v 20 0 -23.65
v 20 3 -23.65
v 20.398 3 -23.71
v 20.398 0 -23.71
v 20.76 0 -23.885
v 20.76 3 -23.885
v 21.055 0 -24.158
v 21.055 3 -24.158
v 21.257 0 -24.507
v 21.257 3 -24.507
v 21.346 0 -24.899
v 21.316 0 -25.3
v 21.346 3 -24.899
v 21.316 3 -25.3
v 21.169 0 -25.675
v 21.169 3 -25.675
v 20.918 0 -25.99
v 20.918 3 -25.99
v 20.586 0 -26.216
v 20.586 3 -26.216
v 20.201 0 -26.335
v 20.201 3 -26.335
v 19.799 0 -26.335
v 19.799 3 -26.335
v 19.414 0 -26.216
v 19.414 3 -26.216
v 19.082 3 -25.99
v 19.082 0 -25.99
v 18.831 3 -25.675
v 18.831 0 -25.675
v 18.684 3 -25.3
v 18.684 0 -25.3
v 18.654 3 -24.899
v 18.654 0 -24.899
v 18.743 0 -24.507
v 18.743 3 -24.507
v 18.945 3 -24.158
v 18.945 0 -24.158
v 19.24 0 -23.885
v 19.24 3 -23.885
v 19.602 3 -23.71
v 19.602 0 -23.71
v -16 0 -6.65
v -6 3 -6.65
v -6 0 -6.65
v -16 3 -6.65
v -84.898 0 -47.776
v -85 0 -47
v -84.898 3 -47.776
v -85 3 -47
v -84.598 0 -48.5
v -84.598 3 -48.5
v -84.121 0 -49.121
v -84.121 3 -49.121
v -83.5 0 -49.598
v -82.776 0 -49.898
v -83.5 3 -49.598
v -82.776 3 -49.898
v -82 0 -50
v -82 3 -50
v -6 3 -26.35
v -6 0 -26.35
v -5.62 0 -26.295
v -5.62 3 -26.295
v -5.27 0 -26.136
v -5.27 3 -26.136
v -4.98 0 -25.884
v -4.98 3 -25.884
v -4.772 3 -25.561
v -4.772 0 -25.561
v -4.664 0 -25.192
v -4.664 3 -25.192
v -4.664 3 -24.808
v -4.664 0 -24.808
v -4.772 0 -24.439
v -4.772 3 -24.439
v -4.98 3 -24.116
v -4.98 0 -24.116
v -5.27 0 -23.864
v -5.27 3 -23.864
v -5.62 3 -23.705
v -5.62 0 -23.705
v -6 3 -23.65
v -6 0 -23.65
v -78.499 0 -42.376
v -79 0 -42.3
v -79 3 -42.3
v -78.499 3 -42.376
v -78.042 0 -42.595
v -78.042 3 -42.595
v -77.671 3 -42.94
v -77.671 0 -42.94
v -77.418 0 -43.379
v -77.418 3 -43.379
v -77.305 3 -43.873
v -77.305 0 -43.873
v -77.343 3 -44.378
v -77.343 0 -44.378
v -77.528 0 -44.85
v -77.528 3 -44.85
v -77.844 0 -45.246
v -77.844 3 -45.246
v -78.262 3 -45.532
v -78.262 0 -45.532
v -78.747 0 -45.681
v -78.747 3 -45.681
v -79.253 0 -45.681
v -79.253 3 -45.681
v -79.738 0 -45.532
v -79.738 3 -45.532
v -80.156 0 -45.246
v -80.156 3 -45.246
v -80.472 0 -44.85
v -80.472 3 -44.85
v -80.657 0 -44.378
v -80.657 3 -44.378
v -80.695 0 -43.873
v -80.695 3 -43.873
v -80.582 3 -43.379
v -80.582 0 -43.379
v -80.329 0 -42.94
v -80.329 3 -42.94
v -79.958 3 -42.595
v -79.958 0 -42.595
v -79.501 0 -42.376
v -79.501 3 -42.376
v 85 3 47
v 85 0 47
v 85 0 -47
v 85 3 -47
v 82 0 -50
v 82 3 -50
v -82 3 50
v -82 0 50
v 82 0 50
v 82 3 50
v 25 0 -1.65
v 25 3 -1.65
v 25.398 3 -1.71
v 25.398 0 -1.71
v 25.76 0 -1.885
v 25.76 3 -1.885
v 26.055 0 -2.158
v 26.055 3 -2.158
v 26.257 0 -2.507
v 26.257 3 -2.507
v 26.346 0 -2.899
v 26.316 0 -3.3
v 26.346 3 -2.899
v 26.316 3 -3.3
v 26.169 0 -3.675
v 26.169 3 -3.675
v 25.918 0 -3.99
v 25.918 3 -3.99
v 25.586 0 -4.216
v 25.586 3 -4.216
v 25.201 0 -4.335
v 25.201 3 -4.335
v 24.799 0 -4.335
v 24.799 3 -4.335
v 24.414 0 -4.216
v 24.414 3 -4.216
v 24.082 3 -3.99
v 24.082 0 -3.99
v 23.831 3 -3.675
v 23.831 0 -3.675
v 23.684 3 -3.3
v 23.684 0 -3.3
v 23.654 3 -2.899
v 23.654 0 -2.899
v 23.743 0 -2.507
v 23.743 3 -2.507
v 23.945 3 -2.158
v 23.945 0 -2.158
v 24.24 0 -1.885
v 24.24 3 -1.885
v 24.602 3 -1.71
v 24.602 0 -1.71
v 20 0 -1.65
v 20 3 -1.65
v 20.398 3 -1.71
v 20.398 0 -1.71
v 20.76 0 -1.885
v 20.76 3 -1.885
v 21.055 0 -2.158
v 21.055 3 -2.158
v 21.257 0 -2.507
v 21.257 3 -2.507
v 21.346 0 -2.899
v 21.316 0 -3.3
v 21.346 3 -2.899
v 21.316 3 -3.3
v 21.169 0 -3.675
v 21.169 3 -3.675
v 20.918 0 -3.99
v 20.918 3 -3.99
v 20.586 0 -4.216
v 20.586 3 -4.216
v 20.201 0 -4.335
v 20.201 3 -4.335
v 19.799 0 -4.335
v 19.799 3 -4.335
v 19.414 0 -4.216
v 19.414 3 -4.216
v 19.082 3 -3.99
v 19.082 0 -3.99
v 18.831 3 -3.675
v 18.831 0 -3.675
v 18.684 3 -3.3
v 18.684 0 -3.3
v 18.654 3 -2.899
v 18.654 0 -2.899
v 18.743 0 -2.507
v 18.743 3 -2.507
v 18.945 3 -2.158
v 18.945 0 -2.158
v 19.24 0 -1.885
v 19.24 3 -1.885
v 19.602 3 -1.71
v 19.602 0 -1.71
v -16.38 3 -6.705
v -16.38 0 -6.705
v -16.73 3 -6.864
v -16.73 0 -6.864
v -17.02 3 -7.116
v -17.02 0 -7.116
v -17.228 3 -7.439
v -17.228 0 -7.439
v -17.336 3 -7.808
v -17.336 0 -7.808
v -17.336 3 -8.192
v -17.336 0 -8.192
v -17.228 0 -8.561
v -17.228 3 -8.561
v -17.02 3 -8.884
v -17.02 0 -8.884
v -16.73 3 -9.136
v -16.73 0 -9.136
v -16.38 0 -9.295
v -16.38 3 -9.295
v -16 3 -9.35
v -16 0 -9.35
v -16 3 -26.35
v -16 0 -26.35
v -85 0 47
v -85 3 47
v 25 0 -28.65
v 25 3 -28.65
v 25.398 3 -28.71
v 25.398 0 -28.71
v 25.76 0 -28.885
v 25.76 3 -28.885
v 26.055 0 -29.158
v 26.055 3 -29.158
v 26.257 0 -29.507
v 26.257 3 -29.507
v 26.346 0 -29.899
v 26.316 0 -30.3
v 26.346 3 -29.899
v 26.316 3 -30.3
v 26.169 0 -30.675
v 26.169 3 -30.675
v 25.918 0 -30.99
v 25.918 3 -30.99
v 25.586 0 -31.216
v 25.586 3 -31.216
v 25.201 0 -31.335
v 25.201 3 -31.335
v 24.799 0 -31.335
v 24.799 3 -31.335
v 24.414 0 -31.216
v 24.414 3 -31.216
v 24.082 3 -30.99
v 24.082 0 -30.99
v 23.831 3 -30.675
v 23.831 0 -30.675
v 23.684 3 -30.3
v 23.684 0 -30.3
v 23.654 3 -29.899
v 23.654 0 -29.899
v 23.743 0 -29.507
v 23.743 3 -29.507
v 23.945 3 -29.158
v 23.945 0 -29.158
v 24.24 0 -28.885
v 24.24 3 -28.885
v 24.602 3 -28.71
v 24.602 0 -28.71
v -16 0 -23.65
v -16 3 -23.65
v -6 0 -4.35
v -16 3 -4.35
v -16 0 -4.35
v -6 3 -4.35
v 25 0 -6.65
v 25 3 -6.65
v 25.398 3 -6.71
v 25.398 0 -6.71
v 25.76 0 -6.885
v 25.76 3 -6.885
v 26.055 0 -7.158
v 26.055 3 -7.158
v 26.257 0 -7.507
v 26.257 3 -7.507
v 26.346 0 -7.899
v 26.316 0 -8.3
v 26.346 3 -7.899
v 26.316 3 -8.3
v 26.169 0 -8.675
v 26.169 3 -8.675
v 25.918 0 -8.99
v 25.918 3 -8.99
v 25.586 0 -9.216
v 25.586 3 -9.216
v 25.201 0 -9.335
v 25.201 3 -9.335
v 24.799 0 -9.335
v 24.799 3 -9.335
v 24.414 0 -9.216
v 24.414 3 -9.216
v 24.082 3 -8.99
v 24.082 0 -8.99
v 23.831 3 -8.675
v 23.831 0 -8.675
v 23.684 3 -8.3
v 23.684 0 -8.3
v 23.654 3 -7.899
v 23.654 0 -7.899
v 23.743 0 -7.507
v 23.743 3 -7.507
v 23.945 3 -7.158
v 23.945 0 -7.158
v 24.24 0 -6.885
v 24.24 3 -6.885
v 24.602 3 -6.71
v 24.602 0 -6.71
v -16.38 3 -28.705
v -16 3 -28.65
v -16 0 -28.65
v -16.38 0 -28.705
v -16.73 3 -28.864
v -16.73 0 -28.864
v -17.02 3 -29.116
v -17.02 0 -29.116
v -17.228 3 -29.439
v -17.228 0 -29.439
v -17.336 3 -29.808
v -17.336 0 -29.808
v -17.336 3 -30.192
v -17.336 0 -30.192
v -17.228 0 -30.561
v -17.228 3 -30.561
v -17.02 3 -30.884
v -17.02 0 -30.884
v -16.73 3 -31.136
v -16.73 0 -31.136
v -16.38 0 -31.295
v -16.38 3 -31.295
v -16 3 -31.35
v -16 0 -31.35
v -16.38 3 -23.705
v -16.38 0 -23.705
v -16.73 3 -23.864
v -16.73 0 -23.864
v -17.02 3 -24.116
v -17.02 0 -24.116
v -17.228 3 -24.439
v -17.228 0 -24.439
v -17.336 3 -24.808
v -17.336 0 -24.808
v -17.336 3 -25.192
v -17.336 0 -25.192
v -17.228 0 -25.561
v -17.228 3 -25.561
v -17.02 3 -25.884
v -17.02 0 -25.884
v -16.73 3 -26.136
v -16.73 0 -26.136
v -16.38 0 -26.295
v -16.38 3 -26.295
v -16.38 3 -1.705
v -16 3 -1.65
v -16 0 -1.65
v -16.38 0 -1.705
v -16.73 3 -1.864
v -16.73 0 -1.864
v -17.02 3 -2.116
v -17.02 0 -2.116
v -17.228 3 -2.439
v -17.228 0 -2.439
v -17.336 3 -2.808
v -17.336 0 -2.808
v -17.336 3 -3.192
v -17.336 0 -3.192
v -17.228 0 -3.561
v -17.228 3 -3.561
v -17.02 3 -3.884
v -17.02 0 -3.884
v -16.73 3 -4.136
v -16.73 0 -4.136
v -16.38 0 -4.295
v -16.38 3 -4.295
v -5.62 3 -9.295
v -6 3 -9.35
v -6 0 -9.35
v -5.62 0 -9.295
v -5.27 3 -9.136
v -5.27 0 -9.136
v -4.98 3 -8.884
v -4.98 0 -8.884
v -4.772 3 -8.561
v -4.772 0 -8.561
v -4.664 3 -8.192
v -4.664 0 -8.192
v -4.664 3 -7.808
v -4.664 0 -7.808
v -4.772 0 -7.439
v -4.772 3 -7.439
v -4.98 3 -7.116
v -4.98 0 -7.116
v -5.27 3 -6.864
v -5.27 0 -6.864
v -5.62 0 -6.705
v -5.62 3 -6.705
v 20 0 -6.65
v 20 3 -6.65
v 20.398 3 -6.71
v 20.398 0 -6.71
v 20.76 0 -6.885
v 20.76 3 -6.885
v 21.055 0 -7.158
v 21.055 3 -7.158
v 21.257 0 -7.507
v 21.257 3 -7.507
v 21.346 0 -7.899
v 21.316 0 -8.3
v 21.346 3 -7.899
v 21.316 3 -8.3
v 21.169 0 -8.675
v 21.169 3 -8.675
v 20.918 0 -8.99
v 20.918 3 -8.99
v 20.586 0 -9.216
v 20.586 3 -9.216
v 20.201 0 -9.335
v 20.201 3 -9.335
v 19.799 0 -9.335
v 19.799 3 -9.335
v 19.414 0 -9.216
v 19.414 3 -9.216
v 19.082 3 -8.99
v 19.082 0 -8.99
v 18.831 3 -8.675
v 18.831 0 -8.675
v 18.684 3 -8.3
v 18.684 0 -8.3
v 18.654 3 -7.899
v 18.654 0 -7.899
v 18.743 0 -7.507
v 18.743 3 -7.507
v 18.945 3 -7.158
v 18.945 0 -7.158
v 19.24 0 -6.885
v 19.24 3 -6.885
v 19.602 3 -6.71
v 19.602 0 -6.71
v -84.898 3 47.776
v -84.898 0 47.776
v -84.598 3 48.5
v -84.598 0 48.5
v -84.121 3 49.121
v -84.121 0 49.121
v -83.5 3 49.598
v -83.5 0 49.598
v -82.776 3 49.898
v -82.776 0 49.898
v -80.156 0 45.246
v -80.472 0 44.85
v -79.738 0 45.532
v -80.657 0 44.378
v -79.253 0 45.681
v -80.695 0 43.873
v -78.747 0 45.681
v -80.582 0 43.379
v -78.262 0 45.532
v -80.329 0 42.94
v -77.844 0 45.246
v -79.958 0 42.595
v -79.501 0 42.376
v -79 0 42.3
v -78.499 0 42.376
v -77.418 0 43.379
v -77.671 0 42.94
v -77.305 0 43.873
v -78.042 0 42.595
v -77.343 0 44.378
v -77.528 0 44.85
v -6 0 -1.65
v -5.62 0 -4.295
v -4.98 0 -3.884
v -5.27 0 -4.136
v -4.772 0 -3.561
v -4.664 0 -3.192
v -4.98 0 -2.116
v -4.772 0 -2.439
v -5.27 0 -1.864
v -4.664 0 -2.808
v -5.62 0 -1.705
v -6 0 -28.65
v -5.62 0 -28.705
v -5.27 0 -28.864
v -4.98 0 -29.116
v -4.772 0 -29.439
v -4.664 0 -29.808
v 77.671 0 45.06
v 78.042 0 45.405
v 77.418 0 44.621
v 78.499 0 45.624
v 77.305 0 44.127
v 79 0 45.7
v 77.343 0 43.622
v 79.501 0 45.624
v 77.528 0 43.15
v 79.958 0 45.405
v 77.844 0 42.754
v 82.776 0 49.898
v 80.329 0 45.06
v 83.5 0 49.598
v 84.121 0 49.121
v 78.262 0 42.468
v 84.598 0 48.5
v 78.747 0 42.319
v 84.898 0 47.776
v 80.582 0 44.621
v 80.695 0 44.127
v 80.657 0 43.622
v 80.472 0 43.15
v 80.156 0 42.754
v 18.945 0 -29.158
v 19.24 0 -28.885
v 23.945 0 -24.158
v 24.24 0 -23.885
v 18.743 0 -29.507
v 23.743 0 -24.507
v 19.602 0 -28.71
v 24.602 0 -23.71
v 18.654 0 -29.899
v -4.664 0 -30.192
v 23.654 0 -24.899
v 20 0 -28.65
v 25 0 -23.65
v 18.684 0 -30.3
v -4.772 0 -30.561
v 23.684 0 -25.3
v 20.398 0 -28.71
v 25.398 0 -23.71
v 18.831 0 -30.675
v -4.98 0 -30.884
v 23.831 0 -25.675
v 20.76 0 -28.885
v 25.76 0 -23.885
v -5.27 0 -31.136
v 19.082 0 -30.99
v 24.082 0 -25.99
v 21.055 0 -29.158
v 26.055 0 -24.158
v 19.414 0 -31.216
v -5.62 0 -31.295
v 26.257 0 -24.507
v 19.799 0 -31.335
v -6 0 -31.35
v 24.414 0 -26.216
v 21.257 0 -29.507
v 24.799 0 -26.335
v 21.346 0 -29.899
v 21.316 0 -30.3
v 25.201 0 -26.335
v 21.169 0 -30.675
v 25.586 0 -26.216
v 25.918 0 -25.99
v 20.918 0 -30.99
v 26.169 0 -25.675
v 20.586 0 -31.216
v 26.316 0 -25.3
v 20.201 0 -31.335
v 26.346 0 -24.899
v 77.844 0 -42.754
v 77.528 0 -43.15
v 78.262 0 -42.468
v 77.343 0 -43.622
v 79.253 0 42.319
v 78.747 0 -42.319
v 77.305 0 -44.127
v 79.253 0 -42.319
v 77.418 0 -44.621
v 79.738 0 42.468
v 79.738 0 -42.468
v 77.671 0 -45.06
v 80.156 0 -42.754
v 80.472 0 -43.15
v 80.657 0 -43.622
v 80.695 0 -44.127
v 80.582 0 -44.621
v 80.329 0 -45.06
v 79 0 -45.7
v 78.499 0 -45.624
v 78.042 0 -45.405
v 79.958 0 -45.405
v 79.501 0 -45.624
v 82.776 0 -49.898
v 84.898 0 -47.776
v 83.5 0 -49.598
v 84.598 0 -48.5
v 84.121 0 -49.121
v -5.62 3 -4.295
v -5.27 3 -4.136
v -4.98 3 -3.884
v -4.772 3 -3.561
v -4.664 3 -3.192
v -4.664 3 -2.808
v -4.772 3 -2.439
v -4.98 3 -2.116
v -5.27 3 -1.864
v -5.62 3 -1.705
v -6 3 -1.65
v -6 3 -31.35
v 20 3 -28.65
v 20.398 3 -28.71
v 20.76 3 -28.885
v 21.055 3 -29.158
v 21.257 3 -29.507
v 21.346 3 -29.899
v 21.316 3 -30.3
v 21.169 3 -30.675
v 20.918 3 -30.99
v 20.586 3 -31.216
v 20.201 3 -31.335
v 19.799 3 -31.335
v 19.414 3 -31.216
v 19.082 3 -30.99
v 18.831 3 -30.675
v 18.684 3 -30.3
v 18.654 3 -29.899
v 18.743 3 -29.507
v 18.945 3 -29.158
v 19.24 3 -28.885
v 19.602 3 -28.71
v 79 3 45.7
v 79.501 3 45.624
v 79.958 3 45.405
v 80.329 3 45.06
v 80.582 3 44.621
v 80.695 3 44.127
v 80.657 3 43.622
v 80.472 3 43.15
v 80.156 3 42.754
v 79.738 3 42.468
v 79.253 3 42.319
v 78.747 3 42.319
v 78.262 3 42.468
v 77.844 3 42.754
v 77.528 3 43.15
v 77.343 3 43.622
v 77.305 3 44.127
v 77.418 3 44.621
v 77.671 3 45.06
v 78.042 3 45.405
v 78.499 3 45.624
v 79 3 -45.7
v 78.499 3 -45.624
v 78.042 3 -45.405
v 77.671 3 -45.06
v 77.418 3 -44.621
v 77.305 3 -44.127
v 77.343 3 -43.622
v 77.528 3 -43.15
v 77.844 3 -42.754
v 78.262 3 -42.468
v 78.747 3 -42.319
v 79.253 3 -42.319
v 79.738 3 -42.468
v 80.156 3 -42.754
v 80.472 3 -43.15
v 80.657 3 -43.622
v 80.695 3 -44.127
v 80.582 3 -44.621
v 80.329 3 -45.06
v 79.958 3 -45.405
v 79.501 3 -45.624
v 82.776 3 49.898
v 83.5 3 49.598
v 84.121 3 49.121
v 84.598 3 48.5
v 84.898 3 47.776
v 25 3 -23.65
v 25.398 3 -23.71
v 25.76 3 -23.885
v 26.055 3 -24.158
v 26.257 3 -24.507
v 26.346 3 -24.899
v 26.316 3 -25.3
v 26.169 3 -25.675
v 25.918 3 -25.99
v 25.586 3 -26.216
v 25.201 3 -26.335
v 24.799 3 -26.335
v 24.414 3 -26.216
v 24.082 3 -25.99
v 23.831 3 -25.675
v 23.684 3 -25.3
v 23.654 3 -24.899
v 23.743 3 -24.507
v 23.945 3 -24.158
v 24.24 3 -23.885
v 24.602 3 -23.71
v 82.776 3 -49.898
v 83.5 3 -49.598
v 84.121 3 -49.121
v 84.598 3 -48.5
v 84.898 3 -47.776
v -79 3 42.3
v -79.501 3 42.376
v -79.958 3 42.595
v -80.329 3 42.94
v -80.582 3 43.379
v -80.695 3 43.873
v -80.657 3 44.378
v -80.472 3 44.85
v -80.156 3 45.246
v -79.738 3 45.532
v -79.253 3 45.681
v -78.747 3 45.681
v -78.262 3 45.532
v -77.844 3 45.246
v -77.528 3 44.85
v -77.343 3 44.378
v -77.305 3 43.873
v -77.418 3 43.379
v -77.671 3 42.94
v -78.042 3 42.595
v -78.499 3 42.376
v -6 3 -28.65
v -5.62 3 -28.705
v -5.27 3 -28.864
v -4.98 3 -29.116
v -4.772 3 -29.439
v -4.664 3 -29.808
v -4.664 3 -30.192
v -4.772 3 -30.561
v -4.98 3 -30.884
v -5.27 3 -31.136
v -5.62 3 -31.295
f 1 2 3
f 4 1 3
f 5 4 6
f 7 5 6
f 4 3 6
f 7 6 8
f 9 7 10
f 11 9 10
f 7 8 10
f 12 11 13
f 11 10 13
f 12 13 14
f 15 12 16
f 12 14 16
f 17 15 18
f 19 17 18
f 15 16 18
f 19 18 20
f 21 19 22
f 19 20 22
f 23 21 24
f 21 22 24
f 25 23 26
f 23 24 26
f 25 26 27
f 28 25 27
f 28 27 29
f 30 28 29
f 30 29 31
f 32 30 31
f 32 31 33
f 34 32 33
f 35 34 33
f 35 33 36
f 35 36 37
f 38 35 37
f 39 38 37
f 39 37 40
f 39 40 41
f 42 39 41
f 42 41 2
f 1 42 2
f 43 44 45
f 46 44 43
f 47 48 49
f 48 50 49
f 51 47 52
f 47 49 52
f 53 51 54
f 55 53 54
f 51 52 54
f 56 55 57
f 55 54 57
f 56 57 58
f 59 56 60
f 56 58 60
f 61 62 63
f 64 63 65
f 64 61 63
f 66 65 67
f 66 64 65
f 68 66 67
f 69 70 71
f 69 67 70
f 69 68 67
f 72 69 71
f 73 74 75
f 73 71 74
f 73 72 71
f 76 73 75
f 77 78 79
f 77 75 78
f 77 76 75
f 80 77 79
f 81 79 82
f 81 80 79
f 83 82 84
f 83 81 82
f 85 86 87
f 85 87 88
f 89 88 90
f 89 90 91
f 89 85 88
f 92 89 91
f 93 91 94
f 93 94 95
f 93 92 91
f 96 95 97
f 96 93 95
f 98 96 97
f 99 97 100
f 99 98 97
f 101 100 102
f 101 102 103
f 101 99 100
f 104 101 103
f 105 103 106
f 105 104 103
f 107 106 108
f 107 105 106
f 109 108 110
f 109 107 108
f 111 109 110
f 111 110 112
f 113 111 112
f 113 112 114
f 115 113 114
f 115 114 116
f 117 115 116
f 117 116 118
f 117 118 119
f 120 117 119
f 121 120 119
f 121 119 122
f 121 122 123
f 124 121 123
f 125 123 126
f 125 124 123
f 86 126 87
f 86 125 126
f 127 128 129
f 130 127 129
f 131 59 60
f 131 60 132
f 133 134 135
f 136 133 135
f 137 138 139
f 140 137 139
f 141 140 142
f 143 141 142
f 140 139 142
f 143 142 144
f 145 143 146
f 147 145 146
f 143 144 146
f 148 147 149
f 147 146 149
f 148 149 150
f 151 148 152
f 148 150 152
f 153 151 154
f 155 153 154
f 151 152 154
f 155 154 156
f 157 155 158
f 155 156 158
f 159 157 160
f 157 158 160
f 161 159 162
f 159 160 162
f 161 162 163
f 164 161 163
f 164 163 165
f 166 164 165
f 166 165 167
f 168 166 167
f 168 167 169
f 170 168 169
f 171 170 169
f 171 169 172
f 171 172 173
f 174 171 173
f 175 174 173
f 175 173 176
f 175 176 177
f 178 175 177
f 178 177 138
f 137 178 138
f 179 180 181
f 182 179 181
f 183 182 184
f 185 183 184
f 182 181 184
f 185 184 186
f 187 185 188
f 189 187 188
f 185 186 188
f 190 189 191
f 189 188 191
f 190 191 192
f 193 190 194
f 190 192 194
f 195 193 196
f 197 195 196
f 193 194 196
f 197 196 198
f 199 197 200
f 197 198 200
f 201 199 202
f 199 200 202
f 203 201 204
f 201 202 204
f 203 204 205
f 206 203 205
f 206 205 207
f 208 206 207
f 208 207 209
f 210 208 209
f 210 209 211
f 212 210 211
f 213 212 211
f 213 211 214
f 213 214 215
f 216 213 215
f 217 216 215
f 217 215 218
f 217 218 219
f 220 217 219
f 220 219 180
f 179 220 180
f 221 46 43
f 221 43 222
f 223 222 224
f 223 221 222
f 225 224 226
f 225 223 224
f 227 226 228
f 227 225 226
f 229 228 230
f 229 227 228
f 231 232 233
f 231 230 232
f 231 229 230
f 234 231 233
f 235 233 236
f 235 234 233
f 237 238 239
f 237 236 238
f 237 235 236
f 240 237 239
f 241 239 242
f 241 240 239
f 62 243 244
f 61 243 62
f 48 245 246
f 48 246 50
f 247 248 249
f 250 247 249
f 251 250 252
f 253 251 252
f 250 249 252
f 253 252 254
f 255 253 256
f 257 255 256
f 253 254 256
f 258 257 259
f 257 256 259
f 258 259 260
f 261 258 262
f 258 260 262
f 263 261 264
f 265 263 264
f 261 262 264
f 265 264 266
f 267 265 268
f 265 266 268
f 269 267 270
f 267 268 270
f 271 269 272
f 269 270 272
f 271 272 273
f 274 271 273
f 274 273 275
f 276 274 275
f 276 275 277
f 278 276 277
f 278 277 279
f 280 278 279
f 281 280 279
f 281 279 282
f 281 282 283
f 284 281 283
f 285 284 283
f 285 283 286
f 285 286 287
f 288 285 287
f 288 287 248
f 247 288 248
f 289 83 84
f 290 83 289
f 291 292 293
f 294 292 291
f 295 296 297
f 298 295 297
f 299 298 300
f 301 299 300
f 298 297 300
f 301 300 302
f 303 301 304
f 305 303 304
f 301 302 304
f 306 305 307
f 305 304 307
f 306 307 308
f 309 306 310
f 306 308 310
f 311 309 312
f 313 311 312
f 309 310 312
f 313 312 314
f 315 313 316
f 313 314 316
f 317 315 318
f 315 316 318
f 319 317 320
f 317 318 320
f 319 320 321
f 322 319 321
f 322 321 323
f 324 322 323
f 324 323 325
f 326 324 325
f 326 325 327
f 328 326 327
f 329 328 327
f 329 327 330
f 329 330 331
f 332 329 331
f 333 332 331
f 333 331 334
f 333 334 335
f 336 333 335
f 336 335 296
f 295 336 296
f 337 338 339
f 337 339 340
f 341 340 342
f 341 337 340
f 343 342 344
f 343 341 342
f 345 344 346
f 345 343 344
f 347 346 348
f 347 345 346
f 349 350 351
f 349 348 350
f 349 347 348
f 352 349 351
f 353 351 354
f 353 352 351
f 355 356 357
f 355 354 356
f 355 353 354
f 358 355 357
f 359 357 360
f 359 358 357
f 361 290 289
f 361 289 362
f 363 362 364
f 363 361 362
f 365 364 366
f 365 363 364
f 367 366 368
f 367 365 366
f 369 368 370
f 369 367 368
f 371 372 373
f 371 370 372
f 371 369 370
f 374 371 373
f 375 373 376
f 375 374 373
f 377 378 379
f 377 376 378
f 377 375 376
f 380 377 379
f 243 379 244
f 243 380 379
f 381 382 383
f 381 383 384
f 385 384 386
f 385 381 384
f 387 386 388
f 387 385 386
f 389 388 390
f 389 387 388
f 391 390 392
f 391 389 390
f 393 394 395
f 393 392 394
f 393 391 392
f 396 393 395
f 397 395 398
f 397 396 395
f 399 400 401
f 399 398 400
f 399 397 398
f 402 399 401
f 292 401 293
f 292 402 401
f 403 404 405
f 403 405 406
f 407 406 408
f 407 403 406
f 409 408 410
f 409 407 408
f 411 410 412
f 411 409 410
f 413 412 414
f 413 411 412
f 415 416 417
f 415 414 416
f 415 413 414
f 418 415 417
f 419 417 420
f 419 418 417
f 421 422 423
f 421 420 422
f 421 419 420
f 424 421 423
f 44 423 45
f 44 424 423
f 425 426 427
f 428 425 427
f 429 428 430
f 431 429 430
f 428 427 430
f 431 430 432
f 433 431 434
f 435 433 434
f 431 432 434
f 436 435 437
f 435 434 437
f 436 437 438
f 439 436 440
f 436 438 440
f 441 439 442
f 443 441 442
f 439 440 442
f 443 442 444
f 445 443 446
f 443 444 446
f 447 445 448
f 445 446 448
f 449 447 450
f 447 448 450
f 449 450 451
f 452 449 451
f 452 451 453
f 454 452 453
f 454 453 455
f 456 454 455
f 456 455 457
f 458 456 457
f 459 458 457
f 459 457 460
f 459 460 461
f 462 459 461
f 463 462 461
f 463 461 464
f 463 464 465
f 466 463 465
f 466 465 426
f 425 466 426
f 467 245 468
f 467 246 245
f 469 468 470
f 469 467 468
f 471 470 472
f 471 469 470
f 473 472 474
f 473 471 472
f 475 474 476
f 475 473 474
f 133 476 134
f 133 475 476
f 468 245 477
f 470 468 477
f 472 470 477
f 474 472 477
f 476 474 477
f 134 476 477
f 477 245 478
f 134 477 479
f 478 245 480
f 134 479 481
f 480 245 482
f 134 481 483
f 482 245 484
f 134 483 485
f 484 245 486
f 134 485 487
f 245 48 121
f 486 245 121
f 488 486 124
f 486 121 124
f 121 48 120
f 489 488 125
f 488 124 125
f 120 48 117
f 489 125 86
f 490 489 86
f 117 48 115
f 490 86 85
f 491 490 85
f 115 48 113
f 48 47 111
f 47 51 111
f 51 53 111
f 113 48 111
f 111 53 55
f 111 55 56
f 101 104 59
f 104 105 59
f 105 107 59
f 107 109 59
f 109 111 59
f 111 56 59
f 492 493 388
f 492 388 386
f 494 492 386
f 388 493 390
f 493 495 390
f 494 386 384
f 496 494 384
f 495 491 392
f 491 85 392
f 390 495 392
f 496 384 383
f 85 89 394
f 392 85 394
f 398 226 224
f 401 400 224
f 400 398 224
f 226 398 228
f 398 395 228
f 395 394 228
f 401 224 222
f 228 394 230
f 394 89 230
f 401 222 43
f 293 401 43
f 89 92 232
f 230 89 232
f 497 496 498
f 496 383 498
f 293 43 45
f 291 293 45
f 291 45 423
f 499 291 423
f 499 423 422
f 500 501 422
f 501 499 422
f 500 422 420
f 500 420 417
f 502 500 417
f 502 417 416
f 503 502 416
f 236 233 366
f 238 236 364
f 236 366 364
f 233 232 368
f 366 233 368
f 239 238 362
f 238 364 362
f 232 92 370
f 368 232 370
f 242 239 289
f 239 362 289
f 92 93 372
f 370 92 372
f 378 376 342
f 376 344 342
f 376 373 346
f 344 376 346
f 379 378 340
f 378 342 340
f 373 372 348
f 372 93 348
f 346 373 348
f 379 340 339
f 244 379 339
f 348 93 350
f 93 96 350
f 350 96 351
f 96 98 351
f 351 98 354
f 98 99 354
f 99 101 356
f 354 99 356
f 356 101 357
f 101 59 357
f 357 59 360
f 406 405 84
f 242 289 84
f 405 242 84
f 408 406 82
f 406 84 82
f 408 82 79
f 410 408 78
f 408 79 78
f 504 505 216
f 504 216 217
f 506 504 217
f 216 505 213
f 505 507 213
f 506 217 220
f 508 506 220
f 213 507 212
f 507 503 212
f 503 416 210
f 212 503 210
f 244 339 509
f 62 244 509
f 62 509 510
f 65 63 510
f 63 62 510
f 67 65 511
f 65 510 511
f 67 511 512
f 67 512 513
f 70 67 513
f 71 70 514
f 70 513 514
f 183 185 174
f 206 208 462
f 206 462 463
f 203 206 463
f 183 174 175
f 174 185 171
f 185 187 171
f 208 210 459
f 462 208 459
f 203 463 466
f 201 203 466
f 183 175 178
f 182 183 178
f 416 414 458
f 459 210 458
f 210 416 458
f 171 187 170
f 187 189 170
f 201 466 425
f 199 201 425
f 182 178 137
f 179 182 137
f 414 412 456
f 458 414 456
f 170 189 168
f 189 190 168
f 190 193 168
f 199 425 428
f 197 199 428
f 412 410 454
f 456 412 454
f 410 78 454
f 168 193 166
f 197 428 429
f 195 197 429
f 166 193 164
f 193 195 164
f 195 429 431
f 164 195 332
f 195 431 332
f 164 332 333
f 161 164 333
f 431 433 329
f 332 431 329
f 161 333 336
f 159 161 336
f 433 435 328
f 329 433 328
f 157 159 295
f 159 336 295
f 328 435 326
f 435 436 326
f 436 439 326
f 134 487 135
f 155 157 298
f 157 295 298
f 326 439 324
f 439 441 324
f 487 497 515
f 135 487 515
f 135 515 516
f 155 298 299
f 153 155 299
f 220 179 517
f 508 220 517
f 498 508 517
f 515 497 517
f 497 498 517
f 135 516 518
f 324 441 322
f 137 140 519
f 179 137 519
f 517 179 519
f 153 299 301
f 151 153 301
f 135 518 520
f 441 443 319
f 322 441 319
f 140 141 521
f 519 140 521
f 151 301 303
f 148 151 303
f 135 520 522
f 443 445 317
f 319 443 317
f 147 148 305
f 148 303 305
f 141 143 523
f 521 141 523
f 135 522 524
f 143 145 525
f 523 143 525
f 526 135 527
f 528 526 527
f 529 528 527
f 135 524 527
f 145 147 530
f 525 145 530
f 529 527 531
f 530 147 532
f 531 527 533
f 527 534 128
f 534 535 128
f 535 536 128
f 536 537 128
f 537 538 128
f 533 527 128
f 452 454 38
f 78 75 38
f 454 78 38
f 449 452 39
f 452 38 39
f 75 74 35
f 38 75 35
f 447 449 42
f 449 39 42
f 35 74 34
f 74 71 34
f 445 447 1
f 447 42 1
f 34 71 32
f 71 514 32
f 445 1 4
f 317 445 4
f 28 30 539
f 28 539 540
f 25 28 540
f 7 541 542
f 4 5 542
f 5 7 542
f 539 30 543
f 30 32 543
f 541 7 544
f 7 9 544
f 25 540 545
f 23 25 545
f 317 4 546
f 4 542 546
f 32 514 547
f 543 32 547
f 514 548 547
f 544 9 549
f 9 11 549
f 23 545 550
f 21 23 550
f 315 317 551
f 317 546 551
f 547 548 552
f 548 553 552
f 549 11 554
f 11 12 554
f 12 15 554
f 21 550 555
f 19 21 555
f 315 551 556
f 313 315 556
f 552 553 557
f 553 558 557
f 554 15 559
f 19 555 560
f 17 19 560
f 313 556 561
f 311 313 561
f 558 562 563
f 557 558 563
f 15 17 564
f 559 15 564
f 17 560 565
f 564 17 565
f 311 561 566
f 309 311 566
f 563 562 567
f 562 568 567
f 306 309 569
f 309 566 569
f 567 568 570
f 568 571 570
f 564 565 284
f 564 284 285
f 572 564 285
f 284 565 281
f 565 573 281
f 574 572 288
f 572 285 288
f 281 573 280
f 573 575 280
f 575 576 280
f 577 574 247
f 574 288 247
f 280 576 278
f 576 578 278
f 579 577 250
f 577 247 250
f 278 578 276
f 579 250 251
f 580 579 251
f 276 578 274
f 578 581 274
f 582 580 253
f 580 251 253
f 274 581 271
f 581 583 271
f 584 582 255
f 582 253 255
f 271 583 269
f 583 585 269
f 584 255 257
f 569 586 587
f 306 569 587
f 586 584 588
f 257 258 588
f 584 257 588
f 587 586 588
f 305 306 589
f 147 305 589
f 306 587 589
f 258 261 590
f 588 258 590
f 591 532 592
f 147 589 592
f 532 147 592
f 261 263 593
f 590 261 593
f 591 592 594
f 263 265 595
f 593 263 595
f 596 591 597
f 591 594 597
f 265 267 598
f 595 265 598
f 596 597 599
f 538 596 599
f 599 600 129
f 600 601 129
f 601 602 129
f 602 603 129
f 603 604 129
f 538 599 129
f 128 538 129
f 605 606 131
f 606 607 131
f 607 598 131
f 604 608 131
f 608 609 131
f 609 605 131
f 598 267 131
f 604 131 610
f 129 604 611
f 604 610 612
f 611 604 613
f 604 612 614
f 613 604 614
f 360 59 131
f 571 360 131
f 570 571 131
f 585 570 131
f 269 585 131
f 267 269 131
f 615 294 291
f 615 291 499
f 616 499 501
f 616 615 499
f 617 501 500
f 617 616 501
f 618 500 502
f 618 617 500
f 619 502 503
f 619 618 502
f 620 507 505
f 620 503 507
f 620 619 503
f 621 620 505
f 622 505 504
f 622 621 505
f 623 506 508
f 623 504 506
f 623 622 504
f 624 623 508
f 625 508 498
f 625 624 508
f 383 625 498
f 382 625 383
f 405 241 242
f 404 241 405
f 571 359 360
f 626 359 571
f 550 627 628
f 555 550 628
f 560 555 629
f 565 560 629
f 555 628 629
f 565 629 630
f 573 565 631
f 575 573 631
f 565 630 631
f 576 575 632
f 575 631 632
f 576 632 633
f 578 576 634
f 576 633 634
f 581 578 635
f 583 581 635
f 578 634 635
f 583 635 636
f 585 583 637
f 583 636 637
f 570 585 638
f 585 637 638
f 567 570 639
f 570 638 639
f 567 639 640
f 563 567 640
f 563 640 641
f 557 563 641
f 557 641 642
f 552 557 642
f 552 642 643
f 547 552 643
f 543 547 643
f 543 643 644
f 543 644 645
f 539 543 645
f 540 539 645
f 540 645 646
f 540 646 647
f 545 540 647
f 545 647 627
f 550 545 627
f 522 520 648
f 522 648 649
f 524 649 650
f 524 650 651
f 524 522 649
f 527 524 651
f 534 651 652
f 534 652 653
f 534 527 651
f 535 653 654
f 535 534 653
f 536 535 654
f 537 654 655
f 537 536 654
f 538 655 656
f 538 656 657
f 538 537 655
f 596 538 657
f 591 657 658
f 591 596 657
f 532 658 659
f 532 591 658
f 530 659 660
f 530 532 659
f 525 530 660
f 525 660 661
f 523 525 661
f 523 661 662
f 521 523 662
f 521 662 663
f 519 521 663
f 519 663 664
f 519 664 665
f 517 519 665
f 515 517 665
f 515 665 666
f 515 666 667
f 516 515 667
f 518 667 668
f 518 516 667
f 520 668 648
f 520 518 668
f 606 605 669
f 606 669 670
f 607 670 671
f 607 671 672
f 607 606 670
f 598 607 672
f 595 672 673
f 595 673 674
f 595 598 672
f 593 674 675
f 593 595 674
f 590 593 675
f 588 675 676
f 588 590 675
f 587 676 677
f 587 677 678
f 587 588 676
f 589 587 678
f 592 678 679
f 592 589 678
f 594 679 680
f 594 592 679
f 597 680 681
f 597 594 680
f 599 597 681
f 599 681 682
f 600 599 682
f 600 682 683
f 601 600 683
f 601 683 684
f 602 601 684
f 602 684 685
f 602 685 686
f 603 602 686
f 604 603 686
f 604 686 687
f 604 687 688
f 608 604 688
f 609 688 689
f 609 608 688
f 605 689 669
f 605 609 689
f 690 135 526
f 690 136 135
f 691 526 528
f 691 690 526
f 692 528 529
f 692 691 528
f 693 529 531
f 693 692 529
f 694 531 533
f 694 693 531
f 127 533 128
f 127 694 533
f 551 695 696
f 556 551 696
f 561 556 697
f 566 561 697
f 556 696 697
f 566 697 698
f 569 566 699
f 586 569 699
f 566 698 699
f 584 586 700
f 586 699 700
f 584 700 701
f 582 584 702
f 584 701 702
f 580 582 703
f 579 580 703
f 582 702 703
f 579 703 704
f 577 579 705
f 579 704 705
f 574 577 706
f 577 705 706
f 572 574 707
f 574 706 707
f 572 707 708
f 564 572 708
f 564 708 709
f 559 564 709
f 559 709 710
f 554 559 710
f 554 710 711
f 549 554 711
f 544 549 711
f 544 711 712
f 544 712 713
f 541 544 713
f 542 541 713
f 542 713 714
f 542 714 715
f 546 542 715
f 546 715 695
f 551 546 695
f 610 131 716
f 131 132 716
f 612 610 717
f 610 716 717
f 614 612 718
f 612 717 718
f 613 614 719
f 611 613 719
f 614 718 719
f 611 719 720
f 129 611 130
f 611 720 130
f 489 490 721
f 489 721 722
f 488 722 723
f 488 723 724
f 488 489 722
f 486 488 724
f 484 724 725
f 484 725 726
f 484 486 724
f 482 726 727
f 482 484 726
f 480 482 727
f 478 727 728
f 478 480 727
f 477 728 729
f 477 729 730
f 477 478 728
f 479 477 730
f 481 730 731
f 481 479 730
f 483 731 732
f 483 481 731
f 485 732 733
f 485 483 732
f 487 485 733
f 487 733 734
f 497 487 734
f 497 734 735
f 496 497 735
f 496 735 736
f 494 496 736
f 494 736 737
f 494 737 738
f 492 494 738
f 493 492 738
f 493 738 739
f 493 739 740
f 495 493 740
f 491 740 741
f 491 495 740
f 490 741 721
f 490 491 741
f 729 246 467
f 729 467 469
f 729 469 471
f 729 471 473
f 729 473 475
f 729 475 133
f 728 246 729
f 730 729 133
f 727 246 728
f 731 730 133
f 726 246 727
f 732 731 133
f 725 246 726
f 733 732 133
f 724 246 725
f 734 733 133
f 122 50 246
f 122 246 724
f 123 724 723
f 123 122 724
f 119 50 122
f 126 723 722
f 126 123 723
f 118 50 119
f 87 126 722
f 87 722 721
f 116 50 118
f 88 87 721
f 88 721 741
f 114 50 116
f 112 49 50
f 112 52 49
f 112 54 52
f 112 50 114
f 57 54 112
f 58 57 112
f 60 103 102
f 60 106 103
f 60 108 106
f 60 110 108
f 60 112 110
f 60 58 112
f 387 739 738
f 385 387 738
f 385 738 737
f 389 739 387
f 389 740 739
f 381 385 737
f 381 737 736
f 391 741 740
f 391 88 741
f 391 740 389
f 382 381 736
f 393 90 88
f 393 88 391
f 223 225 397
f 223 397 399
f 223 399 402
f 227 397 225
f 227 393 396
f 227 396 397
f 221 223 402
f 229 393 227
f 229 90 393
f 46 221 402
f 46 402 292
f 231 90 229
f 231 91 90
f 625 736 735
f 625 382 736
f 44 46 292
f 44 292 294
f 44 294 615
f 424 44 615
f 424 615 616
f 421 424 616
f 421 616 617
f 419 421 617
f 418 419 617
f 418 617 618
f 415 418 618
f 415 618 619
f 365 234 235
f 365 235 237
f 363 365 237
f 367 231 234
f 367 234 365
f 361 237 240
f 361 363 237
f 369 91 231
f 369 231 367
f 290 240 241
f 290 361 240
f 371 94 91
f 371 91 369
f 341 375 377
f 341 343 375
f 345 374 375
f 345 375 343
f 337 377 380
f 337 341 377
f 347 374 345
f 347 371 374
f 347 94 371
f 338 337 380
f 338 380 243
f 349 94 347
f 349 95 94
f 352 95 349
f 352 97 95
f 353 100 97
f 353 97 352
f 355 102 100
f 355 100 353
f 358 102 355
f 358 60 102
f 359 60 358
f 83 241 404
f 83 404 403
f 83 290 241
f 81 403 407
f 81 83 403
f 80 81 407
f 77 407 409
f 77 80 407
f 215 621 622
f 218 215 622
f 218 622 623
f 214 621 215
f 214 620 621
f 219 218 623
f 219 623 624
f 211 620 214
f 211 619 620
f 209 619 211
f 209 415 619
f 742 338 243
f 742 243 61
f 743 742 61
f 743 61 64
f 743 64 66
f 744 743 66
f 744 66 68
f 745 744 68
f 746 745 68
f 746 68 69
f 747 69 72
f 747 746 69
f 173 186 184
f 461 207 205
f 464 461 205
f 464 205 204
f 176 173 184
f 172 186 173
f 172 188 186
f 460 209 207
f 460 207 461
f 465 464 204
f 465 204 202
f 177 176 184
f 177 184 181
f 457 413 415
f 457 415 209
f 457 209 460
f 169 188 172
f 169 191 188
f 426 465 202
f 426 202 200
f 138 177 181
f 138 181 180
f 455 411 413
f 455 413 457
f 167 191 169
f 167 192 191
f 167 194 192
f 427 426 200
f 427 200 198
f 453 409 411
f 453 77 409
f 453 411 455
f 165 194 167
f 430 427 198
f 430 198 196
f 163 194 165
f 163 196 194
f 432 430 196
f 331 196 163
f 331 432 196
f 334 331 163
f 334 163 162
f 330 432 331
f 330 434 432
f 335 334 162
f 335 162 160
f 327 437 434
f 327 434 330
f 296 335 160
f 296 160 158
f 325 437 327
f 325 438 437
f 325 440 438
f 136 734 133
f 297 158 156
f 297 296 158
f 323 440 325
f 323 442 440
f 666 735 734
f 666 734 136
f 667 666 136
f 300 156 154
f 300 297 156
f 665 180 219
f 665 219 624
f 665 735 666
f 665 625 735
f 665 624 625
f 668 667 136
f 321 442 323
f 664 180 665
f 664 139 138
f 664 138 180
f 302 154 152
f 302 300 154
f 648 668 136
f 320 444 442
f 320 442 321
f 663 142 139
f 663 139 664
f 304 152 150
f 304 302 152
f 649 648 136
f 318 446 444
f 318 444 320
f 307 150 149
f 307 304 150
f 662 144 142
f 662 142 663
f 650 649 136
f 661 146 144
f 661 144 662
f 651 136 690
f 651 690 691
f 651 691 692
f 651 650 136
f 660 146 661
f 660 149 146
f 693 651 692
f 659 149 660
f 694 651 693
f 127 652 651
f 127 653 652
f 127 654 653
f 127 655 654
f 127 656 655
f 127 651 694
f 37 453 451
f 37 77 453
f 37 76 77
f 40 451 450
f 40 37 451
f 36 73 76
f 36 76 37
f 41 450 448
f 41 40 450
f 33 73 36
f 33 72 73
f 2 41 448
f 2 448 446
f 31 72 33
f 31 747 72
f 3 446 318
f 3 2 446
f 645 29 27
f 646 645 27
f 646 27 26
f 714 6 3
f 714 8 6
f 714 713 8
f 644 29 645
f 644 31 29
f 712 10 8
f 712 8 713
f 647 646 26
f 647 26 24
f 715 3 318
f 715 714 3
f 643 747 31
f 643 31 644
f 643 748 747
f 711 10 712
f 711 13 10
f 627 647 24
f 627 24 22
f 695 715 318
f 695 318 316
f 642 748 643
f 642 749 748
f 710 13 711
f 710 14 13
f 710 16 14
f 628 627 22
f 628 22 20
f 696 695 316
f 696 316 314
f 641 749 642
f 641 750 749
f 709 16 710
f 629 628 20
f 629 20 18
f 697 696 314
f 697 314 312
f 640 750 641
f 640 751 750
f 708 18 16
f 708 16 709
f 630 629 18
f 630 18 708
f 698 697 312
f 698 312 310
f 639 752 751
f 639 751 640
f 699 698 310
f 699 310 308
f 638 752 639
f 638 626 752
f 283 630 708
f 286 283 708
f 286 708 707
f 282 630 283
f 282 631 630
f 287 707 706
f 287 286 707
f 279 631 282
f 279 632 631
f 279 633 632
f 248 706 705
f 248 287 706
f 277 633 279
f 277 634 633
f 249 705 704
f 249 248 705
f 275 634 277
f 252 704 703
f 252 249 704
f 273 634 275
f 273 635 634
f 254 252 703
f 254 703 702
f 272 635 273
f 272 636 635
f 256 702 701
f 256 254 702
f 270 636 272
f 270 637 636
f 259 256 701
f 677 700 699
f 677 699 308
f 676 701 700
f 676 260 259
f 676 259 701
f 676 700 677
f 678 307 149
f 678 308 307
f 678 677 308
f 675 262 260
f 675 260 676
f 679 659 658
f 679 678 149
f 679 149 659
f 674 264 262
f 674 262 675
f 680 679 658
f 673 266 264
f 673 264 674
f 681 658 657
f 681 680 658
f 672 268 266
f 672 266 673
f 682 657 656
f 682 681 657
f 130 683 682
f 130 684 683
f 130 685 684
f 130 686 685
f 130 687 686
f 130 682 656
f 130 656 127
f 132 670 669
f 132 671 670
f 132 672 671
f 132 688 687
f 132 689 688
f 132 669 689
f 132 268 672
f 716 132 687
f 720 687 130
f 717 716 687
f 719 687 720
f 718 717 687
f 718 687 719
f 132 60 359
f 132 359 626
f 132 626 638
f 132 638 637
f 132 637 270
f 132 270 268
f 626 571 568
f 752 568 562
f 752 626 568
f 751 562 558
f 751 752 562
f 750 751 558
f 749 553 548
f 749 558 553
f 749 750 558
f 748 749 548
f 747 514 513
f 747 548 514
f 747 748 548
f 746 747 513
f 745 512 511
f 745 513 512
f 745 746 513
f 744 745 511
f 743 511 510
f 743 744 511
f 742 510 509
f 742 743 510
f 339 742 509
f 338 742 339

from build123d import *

# Parameters (mm, degrees)
SKETCH_1_W          = 170
SKETCH_1_H          = 100
SKETCH_1_R          = 1.7
EXTRUDE_1_DEPTH     = 3
CUT_EXTRUDE_1_REACH = 100.661
SKETCH_2_R          = 1.35
FILLET_1_R          = 3


with BuildPart() as part:
    # 草图1 → 凸台-拉伸1 (new body)
    with BuildSketch(Plane(origin=(0, 0, 0), x_dir=(1, 0, 0), z_dir=(0, 1, 0))):
        Rectangle(SKETCH_1_W, SKETCH_1_H)
        with Locations(Location((-79, -44, 0), (0, 0, 90))):
            Circle(SKETCH_1_R, mode=Mode.SUBTRACT)
        with Locations(Location((79, 44, 0), (0, 0, 90))):
            Circle(SKETCH_1_R, mode=Mode.SUBTRACT)
        with Locations(Location((79, -44, 0), (0, 0, 270))):
            Circle(SKETCH_1_R, mode=Mode.SUBTRACT)
        with Locations(Location((-79, 44, 0), (0, 0, 270))):
            Circle(SKETCH_1_R, mode=Mode.SUBTRACT)
    extrude(amount=EXTRUDE_1_DEPTH)

    # 草图2 → 切除-拉伸1 (cut, up to next)
    with BuildSketch(Plane(origin=(0, 3, 0), x_dir=(1, 0, 0), z_dir=(0, 1, 0)), mode=Mode.PRIVATE) as cut_extrude_1_sk1:
        with Locations(Location((25, 30, 0), (0, 0, 270))):
            Circle(SKETCH_2_R)
    cut_extrude_1_tool1 = extrude(cut_extrude_1_sk1.sketch, amount=-CUT_EXTRUDE_1_REACH, mode=Mode.PRIVATE) & part.part
    # 草图2 → 切除-拉伸1 (cut, up to next)
    with BuildSketch(Plane(origin=(0, 3, 0), x_dir=(1, 0, 0), z_dir=(0, 1, 0)), mode=Mode.PRIVATE) as cut_extrude_1_sk2:
        with Locations(Location((20, 30, 0), (0, 0, 270))):
            Circle(SKETCH_2_R)
    cut_extrude_1_tool2 = extrude(cut_extrude_1_sk2.sketch, amount=-CUT_EXTRUDE_1_REACH, mode=Mode.PRIVATE) & part.part
    # 草图2 → 切除-拉伸1 (cut, up to next)
    with BuildSketch(Plane(origin=(0, 3, 0), x_dir=(1, 0, 0), z_dir=(0, 1, 0)), mode=Mode.PRIVATE) as cut_extrude_1_sk3:
        with Locations(Location((25, 25, 0), (0, 0, 270))):
            Circle(SKETCH_2_R)
    cut_extrude_1_tool3 = extrude(cut_extrude_1_sk3.sketch, amount=-CUT_EXTRUDE_1_REACH, mode=Mode.PRIVATE) & part.part
    # 草图2 → 切除-拉伸1 (cut, up to next)
    with BuildSketch(Plane(origin=(0, 3, 0), x_dir=(1, 0, 0), z_dir=(0, 1, 0)), mode=Mode.PRIVATE) as cut_extrude_1_sk4:
        with Locations(Location((20, 25, 0), (0, 0, 270))):
            Circle(SKETCH_2_R)
    cut_extrude_1_tool4 = extrude(cut_extrude_1_sk4.sketch, amount=-CUT_EXTRUDE_1_REACH, mode=Mode.PRIVATE) & part.part
    # 草图2 → 切除-拉伸1 (cut, up to next)
    with BuildSketch(Plane(origin=(0, 3, 0), x_dir=(1, 0, 0), z_dir=(0, 1, 0)), mode=Mode.PRIVATE) as cut_extrude_1_sk5:
        with Locations(Location((25, 8, 0), (0, 0, 270))):
            Circle(SKETCH_2_R)
    cut_extrude_1_tool5 = extrude(cut_extrude_1_sk5.sketch, amount=-CUT_EXTRUDE_1_REACH, mode=Mode.PRIVATE) & part.part
    # 草图2 → 切除-拉伸1 (cut, up to next)
    with BuildSketch(Plane(origin=(0, 3, 0), x_dir=(1, 0, 0), z_dir=(0, 1, 0)), mode=Mode.PRIVATE) as cut_extrude_1_sk6:
        with Locations(Location((20, 8, 0), (0, 0, 270))):
            Circle(SKETCH_2_R)
    cut_extrude_1_tool6 = extrude(cut_extrude_1_sk6.sketch, amount=-CUT_EXTRUDE_1_REACH, mode=Mode.PRIVATE) & part.part
    # 草图2 → 切除-拉伸1 (cut, up to next)
    with BuildSketch(Plane(origin=(0, 3, 0), x_dir=(1, 0, 0), z_dir=(0, 1, 0)), mode=Mode.PRIVATE) as cut_extrude_1_sk7:
        with Locations(Location((25, 3, 0), (0, 0, 270))):
            Circle(SKETCH_2_R)
    cut_extrude_1_tool7 = extrude(cut_extrude_1_sk7.sketch, amount=-CUT_EXTRUDE_1_REACH, mode=Mode.PRIVATE) & part.part
    # 草图2 → 切除-拉伸1 (cut, up to next)
    with BuildSketch(Plane(origin=(0, 3, 0), x_dir=(1, 0, 0), z_dir=(0, 1, 0)), mode=Mode.PRIVATE) as cut_extrude_1_sk8:
        with Locations(Location((20, 3, 0), (0, 0, 270))):
            Circle(SKETCH_2_R)
    cut_extrude_1_tool8 = extrude(cut_extrude_1_sk8.sketch, amount=-CUT_EXTRUDE_1_REACH, mode=Mode.PRIVATE) & part.part
    # 草图2 → 切除-拉伸1 (cut, up to next)
    with BuildSketch(Plane(origin=(0, 3, 0), x_dir=(1, 0, 0), z_dir=(0, 1, 0)), mode=Mode.PRIVATE) as cut_extrude_1_sk9:
        with BuildLine():
            Line((-16, 26.35), (-6, 26.35))
            ThreePointArc((-6, 26.35), (-4.65, 25), (-6, 23.65))
            Line((-6, 23.65), (-16, 23.65))
            ThreePointArc((-16, 23.65), (-17.35, 25), (-16, 26.35))
        make_face()
    cut_extrude_1_tool9 = extrude(cut_extrude_1_sk9.sketch, amount=-CUT_EXTRUDE_1_REACH, mode=Mode.PRIVATE) & part.part
    # 草图2 → 切除-拉伸1 (cut, up to next)
    with BuildSketch(Plane(origin=(0, 3, 0), x_dir=(1, 0, 0), z_dir=(0, 1, 0)), mode=Mode.PRIVATE) as cut_extrude_1_sk10:
        with BuildLine():
            Line((-16, 31.35), (-6, 31.35))
            ThreePointArc((-6, 31.35), (-4.65, 30), (-6, 28.65))
            Line((-6, 28.65), (-16, 28.65))
            ThreePointArc((-16, 28.65), (-17.35, 30), (-16, 31.35))
        make_face()
    cut_extrude_1_tool10 = extrude(cut_extrude_1_sk10.sketch, amount=-CUT_EXTRUDE_1_REACH, mode=Mode.PRIVATE) & part.part
    # 草图2 → 切除-拉伸1 (cut, up to next)
    with BuildSketch(Plane(origin=(0, 3, 0), x_dir=(1, 0, 0), z_dir=(0, 1, 0)), mode=Mode.PRIVATE) as cut_extrude_1_sk11:
        with BuildLine():
            Line((-16, 4.35), (-6, 4.35))
            ThreePointArc((-6, 4.35), (-4.65, 3), (-6, 1.65))
            Line((-6, 1.65), (-16, 1.65))
            ThreePointArc((-16, 1.65), (-17.35, 3), (-16, 4.35))
        make_face()
    cut_extrude_1_tool11 = extrude(cut_extrude_1_sk11.sketch, amount=-CUT_EXTRUDE_1_REACH, mode=Mode.PRIVATE) & part.part
    # 草图2 → 切除-拉伸1 (cut, up to next)
    with BuildSketch(Plane(origin=(0, 3, 0), x_dir=(1, 0, 0), z_dir=(0, 1, 0)), mode=Mode.PRIVATE) as cut_extrude_1_sk12:
        with BuildLine():
            Line((-16, 9.35), (-6, 9.35))
            ThreePointArc((-6, 9.35), (-4.65, 8), (-6, 6.65))
            Line((-6, 6.65), (-16, 6.65))
            ThreePointArc((-16, 6.65), (-17.35, 8), (-16, 9.35))
        make_face()
    cut_extrude_1_tool12 = extrude(cut_extrude_1_sk12.sketch, amount=-CUT_EXTRUDE_1_REACH, mode=Mode.PRIVATE) & part.part
    add(cut_extrude_1_tool1.solids().sort_by_distance((25, 3, -30))[0], mode=Mode.SUBTRACT)
    add(cut_extrude_1_tool2.solids().sort_by_distance((20, 3, -30))[0], mode=Mode.SUBTRACT)
    add(cut_extrude_1_tool3.solids().sort_by_distance((25, 3, -25))[0], mode=Mode.SUBTRACT)
    add(cut_extrude_1_tool4.solids().sort_by_distance((20, 3, -25))[0], mode=Mode.SUBTRACT)
    add(cut_extrude_1_tool5.solids().sort_by_distance((25, 3, -8))[0], mode=Mode.SUBTRACT)
    add(cut_extrude_1_tool6.solids().sort_by_distance((20, 3, -8))[0], mode=Mode.SUBTRACT)
    add(cut_extrude_1_tool7.solids().sort_by_distance((25, 3, -3))[0], mode=Mode.SUBTRACT)
    add(cut_extrude_1_tool8.solids().sort_by_distance((20, 3, -3))[0], mode=Mode.SUBTRACT)
    add(cut_extrude_1_tool9.solids().sort_by_distance((-11, 3, -25))[0], mode=Mode.SUBTRACT)
    add(cut_extrude_1_tool10.solids().sort_by_distance((-11, 3, -30))[0], mode=Mode.SUBTRACT)
    add(cut_extrude_1_tool11.solids().sort_by_distance((-11, 3, -3))[0], mode=Mode.SUBTRACT)
    add(cut_extrude_1_tool12.solids().sort_by_distance((-11, 3, -8))[0], mode=Mode.SUBTRACT)

    # 圆角1
    fillet_1_edges = [part.edges().sort_by_distance(p)[0] for p in [
        (85, 1.5, 50),
        (-85, 1.5, 50),
        (-85, 1.5, -50),
        (85, 1.5, -50),
    ]]
    fillet(fillet_1_edges, radius=FILLET_1_R)


solid = part.part
